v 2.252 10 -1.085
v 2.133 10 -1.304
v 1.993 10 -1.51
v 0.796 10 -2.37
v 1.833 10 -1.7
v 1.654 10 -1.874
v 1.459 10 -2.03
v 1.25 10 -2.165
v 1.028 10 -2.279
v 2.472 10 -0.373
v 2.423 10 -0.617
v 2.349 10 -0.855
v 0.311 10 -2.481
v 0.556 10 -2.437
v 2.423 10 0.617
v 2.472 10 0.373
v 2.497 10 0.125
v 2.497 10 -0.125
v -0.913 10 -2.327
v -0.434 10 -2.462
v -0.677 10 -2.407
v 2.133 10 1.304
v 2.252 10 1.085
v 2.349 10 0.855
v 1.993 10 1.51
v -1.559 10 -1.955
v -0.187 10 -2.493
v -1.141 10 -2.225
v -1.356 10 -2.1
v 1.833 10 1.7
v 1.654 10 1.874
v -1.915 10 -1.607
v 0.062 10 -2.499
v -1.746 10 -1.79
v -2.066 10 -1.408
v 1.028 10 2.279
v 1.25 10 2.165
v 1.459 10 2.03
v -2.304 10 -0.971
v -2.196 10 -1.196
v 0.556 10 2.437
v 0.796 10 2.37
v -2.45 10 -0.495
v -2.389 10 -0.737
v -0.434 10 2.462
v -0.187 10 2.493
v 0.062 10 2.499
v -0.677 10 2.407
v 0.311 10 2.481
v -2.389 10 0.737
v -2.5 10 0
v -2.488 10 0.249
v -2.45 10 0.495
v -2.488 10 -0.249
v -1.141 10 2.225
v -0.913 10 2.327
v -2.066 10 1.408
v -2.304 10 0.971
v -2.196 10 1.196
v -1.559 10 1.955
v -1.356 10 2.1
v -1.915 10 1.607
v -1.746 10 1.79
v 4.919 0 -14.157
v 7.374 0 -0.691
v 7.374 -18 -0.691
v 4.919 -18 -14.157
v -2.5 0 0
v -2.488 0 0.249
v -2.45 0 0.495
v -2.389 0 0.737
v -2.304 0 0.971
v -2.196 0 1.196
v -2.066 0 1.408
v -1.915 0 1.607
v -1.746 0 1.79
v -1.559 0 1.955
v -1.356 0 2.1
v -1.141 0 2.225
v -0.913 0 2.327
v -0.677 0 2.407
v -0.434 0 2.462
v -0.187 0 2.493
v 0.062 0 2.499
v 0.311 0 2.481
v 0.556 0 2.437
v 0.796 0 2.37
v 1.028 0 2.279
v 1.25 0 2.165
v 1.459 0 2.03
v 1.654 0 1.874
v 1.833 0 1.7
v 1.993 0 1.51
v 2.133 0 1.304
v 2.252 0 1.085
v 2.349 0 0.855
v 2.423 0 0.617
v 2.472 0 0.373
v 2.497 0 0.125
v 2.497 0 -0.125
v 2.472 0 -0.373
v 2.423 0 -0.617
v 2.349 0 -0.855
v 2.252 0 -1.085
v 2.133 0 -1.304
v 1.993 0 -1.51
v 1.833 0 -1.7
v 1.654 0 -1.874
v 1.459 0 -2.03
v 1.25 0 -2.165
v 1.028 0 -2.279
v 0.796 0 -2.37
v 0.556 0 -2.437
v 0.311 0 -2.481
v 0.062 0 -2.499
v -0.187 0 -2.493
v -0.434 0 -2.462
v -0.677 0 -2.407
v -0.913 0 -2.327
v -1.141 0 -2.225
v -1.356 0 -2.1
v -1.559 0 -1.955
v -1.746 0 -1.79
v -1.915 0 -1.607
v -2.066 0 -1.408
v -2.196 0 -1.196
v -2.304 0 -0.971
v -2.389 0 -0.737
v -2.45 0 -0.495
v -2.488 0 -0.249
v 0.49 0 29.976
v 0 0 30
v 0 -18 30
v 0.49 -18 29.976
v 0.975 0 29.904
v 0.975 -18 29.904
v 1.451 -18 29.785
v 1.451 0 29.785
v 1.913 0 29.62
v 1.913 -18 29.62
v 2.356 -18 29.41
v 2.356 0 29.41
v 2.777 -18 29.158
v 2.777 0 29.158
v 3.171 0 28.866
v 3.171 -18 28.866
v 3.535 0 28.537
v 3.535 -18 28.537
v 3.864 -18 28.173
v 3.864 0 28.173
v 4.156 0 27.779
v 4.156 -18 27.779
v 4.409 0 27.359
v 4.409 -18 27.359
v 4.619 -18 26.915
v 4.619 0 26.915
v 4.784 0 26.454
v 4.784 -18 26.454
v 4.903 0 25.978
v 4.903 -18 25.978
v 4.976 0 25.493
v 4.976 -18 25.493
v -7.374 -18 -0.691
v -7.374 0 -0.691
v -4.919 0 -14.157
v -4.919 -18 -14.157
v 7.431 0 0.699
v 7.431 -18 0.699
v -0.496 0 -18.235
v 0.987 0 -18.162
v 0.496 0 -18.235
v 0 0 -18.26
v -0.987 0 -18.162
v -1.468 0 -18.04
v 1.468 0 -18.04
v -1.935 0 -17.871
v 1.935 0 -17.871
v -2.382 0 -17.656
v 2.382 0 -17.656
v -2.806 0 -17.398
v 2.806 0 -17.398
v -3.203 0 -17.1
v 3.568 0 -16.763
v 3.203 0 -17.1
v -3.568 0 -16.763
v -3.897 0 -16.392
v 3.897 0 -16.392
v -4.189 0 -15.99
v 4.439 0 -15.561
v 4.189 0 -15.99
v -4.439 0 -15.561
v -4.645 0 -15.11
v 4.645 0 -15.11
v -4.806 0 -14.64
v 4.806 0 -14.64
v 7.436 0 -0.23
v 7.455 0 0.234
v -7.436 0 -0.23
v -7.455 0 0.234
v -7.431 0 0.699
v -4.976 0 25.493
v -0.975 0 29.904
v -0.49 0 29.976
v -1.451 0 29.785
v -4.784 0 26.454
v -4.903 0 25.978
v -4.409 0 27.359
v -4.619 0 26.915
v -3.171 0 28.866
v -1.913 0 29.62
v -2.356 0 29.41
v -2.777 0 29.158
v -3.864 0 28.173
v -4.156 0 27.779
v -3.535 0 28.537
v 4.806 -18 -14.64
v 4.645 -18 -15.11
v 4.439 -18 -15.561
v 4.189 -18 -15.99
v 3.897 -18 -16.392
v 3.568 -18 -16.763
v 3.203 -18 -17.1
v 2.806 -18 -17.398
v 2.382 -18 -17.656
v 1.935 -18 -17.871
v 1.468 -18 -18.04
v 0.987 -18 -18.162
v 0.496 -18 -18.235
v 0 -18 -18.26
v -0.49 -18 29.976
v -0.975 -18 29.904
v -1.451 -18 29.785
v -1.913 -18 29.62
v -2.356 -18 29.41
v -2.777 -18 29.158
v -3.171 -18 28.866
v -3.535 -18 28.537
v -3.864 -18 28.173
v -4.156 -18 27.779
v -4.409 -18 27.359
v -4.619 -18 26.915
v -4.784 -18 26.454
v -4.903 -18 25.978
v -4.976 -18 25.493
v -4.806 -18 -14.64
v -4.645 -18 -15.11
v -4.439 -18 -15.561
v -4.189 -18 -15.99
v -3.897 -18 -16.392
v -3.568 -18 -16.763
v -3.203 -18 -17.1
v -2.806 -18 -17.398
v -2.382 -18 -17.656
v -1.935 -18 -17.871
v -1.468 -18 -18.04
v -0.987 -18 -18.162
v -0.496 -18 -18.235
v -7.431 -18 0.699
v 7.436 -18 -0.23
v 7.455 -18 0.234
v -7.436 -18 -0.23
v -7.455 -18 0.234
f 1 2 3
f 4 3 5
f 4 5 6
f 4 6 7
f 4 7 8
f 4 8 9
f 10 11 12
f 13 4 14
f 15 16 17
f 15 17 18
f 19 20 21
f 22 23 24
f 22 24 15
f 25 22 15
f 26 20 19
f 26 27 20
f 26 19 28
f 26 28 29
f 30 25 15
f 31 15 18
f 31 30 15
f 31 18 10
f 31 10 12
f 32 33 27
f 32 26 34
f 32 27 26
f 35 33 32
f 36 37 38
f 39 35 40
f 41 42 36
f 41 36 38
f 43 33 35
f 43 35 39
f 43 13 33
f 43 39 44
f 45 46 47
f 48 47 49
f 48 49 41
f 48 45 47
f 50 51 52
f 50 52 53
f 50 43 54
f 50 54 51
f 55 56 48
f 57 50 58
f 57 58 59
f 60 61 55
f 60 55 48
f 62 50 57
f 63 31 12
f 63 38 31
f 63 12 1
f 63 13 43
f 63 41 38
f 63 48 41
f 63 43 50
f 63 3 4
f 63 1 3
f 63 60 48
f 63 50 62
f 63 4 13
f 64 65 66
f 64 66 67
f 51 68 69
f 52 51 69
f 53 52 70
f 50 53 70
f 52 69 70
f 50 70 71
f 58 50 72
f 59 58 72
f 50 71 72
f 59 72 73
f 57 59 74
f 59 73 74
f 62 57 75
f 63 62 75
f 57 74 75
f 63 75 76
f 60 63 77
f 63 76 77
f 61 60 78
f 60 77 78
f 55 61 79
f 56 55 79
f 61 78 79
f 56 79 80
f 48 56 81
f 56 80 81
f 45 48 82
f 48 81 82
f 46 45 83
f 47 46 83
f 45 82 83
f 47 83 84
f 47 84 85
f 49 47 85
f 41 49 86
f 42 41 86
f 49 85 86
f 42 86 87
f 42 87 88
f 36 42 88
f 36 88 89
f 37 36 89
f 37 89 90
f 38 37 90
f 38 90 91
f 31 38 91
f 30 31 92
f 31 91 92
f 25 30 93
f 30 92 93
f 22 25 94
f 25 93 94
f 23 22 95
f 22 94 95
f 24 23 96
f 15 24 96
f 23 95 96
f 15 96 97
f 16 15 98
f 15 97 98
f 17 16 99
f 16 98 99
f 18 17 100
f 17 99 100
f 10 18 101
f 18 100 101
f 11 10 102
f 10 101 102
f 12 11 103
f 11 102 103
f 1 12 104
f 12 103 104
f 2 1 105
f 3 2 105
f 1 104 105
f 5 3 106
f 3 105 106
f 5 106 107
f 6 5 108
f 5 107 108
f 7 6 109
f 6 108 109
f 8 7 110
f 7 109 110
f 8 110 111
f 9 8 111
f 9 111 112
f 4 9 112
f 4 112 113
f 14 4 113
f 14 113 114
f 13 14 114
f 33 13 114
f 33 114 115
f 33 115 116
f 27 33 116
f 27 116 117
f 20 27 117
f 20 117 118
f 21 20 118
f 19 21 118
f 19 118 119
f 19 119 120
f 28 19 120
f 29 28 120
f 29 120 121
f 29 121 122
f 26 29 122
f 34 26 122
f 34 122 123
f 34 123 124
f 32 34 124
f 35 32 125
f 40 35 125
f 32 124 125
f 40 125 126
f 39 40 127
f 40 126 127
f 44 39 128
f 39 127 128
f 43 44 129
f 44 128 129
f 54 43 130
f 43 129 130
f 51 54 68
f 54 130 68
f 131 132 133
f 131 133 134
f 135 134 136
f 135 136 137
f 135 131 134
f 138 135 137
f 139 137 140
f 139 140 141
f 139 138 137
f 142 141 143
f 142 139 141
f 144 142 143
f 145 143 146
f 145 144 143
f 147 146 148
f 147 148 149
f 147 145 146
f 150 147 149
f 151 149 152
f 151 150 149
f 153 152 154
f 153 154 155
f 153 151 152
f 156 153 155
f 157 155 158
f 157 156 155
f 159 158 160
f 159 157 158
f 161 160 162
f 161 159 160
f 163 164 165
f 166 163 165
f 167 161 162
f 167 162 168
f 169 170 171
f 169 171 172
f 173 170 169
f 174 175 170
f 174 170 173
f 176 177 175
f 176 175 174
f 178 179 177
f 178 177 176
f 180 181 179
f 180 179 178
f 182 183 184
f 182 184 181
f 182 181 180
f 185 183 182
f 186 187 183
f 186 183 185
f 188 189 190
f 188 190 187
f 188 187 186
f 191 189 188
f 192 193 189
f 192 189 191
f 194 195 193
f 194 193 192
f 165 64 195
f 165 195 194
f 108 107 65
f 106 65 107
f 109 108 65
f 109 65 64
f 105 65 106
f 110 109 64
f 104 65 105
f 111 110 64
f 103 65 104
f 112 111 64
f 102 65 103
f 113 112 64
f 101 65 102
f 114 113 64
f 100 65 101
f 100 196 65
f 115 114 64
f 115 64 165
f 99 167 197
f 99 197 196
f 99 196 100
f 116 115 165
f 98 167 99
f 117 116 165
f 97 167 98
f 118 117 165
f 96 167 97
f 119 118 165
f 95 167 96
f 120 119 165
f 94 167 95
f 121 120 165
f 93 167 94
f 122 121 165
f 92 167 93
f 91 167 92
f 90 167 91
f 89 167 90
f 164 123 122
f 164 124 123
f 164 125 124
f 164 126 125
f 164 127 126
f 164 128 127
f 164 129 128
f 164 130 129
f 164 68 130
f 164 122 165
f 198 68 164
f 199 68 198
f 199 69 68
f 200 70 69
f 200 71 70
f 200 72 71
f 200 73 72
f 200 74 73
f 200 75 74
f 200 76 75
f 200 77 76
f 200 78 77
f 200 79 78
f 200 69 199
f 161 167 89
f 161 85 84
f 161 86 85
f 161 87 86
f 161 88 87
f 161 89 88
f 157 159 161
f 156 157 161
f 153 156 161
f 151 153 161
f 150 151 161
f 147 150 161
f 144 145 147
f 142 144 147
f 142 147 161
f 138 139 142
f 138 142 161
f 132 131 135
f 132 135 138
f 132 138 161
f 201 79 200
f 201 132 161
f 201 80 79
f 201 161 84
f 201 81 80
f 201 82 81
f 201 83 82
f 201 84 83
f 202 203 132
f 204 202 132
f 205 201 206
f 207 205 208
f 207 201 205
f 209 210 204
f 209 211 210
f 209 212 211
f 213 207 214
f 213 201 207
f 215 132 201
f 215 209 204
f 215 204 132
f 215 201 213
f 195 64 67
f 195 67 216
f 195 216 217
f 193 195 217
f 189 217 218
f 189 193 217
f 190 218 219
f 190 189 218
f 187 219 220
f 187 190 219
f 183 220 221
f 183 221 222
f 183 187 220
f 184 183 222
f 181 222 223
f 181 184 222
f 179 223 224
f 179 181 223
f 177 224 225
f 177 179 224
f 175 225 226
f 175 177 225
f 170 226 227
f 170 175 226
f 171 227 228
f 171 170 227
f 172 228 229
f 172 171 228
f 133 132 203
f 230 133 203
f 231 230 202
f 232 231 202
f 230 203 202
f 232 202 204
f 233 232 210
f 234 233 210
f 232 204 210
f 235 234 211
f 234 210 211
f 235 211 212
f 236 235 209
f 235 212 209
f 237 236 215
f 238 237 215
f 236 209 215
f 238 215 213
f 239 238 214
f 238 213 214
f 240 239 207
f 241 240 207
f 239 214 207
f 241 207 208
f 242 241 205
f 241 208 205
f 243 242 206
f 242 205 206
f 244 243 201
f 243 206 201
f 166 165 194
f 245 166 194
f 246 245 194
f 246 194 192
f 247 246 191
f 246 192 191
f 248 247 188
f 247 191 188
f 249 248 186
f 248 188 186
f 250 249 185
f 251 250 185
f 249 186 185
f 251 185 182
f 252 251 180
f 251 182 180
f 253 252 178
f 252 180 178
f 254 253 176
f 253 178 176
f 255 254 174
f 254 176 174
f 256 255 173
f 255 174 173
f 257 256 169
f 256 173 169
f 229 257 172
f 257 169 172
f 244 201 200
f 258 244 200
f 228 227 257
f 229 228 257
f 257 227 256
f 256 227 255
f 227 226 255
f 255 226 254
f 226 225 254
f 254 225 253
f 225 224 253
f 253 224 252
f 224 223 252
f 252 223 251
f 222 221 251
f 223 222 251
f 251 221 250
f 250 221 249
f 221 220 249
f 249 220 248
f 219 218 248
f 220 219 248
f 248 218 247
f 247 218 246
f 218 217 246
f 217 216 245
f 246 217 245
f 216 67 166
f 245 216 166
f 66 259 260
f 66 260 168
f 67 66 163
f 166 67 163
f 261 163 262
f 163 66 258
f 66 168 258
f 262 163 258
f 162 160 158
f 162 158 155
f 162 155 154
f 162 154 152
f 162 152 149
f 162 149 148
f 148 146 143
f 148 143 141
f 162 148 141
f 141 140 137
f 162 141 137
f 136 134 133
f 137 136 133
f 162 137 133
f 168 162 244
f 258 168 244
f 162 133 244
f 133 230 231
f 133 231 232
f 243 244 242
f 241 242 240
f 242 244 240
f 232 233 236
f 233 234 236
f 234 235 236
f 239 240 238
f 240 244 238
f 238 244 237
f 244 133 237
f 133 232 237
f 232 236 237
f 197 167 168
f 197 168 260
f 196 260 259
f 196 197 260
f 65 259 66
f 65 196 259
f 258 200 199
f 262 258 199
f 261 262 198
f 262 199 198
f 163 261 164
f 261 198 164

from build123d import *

# Parameters (mm, degrees)
F1_DEPTH = 18
F3_R     = 2.5
F4_DEPTH = 10


with BuildPart() as f1:
    # F0 (on Front) → F1 (new body)
    with BuildSketch(Plane.XZ):
        with BuildLine():
            Line((0, -18.26), (0, 30))
            ThreePointArc((0, 30), (-3.356822, 28.705637), (-4.975665, 25.4927))
            Line((-4.975665, 25.4927), (-7.430809, 0.698745))
            ThreePointArc((-7.430809, 0.698745), (-7.450978, 0.002002), (-7.374057, -0.690776))
            Line((-7.374057, -0.690776), (-4.918914, -14.156821))
            ThreePointArc((-4.918914, -14.156821), (-3.202803, -17.099538), (0, -18.26))
        make_face()
    extrude(amount=F1_DEPTH)

    # F2: F1 across plane


with BuildPart() as f1_1:
    add(f1.part)
    add(f1.part.mirror(Plane.YZ))

    # F3 (on face) → F4 (join)
    with BuildSketch(Plane(origin=(0, 0, 0), x_dir=(-1, 0, 0), z_dir=(0, 1, 0))):
        Circle(F3_R)
    extrude(amount=F4_DEPTH)


solid = f1_1.part
